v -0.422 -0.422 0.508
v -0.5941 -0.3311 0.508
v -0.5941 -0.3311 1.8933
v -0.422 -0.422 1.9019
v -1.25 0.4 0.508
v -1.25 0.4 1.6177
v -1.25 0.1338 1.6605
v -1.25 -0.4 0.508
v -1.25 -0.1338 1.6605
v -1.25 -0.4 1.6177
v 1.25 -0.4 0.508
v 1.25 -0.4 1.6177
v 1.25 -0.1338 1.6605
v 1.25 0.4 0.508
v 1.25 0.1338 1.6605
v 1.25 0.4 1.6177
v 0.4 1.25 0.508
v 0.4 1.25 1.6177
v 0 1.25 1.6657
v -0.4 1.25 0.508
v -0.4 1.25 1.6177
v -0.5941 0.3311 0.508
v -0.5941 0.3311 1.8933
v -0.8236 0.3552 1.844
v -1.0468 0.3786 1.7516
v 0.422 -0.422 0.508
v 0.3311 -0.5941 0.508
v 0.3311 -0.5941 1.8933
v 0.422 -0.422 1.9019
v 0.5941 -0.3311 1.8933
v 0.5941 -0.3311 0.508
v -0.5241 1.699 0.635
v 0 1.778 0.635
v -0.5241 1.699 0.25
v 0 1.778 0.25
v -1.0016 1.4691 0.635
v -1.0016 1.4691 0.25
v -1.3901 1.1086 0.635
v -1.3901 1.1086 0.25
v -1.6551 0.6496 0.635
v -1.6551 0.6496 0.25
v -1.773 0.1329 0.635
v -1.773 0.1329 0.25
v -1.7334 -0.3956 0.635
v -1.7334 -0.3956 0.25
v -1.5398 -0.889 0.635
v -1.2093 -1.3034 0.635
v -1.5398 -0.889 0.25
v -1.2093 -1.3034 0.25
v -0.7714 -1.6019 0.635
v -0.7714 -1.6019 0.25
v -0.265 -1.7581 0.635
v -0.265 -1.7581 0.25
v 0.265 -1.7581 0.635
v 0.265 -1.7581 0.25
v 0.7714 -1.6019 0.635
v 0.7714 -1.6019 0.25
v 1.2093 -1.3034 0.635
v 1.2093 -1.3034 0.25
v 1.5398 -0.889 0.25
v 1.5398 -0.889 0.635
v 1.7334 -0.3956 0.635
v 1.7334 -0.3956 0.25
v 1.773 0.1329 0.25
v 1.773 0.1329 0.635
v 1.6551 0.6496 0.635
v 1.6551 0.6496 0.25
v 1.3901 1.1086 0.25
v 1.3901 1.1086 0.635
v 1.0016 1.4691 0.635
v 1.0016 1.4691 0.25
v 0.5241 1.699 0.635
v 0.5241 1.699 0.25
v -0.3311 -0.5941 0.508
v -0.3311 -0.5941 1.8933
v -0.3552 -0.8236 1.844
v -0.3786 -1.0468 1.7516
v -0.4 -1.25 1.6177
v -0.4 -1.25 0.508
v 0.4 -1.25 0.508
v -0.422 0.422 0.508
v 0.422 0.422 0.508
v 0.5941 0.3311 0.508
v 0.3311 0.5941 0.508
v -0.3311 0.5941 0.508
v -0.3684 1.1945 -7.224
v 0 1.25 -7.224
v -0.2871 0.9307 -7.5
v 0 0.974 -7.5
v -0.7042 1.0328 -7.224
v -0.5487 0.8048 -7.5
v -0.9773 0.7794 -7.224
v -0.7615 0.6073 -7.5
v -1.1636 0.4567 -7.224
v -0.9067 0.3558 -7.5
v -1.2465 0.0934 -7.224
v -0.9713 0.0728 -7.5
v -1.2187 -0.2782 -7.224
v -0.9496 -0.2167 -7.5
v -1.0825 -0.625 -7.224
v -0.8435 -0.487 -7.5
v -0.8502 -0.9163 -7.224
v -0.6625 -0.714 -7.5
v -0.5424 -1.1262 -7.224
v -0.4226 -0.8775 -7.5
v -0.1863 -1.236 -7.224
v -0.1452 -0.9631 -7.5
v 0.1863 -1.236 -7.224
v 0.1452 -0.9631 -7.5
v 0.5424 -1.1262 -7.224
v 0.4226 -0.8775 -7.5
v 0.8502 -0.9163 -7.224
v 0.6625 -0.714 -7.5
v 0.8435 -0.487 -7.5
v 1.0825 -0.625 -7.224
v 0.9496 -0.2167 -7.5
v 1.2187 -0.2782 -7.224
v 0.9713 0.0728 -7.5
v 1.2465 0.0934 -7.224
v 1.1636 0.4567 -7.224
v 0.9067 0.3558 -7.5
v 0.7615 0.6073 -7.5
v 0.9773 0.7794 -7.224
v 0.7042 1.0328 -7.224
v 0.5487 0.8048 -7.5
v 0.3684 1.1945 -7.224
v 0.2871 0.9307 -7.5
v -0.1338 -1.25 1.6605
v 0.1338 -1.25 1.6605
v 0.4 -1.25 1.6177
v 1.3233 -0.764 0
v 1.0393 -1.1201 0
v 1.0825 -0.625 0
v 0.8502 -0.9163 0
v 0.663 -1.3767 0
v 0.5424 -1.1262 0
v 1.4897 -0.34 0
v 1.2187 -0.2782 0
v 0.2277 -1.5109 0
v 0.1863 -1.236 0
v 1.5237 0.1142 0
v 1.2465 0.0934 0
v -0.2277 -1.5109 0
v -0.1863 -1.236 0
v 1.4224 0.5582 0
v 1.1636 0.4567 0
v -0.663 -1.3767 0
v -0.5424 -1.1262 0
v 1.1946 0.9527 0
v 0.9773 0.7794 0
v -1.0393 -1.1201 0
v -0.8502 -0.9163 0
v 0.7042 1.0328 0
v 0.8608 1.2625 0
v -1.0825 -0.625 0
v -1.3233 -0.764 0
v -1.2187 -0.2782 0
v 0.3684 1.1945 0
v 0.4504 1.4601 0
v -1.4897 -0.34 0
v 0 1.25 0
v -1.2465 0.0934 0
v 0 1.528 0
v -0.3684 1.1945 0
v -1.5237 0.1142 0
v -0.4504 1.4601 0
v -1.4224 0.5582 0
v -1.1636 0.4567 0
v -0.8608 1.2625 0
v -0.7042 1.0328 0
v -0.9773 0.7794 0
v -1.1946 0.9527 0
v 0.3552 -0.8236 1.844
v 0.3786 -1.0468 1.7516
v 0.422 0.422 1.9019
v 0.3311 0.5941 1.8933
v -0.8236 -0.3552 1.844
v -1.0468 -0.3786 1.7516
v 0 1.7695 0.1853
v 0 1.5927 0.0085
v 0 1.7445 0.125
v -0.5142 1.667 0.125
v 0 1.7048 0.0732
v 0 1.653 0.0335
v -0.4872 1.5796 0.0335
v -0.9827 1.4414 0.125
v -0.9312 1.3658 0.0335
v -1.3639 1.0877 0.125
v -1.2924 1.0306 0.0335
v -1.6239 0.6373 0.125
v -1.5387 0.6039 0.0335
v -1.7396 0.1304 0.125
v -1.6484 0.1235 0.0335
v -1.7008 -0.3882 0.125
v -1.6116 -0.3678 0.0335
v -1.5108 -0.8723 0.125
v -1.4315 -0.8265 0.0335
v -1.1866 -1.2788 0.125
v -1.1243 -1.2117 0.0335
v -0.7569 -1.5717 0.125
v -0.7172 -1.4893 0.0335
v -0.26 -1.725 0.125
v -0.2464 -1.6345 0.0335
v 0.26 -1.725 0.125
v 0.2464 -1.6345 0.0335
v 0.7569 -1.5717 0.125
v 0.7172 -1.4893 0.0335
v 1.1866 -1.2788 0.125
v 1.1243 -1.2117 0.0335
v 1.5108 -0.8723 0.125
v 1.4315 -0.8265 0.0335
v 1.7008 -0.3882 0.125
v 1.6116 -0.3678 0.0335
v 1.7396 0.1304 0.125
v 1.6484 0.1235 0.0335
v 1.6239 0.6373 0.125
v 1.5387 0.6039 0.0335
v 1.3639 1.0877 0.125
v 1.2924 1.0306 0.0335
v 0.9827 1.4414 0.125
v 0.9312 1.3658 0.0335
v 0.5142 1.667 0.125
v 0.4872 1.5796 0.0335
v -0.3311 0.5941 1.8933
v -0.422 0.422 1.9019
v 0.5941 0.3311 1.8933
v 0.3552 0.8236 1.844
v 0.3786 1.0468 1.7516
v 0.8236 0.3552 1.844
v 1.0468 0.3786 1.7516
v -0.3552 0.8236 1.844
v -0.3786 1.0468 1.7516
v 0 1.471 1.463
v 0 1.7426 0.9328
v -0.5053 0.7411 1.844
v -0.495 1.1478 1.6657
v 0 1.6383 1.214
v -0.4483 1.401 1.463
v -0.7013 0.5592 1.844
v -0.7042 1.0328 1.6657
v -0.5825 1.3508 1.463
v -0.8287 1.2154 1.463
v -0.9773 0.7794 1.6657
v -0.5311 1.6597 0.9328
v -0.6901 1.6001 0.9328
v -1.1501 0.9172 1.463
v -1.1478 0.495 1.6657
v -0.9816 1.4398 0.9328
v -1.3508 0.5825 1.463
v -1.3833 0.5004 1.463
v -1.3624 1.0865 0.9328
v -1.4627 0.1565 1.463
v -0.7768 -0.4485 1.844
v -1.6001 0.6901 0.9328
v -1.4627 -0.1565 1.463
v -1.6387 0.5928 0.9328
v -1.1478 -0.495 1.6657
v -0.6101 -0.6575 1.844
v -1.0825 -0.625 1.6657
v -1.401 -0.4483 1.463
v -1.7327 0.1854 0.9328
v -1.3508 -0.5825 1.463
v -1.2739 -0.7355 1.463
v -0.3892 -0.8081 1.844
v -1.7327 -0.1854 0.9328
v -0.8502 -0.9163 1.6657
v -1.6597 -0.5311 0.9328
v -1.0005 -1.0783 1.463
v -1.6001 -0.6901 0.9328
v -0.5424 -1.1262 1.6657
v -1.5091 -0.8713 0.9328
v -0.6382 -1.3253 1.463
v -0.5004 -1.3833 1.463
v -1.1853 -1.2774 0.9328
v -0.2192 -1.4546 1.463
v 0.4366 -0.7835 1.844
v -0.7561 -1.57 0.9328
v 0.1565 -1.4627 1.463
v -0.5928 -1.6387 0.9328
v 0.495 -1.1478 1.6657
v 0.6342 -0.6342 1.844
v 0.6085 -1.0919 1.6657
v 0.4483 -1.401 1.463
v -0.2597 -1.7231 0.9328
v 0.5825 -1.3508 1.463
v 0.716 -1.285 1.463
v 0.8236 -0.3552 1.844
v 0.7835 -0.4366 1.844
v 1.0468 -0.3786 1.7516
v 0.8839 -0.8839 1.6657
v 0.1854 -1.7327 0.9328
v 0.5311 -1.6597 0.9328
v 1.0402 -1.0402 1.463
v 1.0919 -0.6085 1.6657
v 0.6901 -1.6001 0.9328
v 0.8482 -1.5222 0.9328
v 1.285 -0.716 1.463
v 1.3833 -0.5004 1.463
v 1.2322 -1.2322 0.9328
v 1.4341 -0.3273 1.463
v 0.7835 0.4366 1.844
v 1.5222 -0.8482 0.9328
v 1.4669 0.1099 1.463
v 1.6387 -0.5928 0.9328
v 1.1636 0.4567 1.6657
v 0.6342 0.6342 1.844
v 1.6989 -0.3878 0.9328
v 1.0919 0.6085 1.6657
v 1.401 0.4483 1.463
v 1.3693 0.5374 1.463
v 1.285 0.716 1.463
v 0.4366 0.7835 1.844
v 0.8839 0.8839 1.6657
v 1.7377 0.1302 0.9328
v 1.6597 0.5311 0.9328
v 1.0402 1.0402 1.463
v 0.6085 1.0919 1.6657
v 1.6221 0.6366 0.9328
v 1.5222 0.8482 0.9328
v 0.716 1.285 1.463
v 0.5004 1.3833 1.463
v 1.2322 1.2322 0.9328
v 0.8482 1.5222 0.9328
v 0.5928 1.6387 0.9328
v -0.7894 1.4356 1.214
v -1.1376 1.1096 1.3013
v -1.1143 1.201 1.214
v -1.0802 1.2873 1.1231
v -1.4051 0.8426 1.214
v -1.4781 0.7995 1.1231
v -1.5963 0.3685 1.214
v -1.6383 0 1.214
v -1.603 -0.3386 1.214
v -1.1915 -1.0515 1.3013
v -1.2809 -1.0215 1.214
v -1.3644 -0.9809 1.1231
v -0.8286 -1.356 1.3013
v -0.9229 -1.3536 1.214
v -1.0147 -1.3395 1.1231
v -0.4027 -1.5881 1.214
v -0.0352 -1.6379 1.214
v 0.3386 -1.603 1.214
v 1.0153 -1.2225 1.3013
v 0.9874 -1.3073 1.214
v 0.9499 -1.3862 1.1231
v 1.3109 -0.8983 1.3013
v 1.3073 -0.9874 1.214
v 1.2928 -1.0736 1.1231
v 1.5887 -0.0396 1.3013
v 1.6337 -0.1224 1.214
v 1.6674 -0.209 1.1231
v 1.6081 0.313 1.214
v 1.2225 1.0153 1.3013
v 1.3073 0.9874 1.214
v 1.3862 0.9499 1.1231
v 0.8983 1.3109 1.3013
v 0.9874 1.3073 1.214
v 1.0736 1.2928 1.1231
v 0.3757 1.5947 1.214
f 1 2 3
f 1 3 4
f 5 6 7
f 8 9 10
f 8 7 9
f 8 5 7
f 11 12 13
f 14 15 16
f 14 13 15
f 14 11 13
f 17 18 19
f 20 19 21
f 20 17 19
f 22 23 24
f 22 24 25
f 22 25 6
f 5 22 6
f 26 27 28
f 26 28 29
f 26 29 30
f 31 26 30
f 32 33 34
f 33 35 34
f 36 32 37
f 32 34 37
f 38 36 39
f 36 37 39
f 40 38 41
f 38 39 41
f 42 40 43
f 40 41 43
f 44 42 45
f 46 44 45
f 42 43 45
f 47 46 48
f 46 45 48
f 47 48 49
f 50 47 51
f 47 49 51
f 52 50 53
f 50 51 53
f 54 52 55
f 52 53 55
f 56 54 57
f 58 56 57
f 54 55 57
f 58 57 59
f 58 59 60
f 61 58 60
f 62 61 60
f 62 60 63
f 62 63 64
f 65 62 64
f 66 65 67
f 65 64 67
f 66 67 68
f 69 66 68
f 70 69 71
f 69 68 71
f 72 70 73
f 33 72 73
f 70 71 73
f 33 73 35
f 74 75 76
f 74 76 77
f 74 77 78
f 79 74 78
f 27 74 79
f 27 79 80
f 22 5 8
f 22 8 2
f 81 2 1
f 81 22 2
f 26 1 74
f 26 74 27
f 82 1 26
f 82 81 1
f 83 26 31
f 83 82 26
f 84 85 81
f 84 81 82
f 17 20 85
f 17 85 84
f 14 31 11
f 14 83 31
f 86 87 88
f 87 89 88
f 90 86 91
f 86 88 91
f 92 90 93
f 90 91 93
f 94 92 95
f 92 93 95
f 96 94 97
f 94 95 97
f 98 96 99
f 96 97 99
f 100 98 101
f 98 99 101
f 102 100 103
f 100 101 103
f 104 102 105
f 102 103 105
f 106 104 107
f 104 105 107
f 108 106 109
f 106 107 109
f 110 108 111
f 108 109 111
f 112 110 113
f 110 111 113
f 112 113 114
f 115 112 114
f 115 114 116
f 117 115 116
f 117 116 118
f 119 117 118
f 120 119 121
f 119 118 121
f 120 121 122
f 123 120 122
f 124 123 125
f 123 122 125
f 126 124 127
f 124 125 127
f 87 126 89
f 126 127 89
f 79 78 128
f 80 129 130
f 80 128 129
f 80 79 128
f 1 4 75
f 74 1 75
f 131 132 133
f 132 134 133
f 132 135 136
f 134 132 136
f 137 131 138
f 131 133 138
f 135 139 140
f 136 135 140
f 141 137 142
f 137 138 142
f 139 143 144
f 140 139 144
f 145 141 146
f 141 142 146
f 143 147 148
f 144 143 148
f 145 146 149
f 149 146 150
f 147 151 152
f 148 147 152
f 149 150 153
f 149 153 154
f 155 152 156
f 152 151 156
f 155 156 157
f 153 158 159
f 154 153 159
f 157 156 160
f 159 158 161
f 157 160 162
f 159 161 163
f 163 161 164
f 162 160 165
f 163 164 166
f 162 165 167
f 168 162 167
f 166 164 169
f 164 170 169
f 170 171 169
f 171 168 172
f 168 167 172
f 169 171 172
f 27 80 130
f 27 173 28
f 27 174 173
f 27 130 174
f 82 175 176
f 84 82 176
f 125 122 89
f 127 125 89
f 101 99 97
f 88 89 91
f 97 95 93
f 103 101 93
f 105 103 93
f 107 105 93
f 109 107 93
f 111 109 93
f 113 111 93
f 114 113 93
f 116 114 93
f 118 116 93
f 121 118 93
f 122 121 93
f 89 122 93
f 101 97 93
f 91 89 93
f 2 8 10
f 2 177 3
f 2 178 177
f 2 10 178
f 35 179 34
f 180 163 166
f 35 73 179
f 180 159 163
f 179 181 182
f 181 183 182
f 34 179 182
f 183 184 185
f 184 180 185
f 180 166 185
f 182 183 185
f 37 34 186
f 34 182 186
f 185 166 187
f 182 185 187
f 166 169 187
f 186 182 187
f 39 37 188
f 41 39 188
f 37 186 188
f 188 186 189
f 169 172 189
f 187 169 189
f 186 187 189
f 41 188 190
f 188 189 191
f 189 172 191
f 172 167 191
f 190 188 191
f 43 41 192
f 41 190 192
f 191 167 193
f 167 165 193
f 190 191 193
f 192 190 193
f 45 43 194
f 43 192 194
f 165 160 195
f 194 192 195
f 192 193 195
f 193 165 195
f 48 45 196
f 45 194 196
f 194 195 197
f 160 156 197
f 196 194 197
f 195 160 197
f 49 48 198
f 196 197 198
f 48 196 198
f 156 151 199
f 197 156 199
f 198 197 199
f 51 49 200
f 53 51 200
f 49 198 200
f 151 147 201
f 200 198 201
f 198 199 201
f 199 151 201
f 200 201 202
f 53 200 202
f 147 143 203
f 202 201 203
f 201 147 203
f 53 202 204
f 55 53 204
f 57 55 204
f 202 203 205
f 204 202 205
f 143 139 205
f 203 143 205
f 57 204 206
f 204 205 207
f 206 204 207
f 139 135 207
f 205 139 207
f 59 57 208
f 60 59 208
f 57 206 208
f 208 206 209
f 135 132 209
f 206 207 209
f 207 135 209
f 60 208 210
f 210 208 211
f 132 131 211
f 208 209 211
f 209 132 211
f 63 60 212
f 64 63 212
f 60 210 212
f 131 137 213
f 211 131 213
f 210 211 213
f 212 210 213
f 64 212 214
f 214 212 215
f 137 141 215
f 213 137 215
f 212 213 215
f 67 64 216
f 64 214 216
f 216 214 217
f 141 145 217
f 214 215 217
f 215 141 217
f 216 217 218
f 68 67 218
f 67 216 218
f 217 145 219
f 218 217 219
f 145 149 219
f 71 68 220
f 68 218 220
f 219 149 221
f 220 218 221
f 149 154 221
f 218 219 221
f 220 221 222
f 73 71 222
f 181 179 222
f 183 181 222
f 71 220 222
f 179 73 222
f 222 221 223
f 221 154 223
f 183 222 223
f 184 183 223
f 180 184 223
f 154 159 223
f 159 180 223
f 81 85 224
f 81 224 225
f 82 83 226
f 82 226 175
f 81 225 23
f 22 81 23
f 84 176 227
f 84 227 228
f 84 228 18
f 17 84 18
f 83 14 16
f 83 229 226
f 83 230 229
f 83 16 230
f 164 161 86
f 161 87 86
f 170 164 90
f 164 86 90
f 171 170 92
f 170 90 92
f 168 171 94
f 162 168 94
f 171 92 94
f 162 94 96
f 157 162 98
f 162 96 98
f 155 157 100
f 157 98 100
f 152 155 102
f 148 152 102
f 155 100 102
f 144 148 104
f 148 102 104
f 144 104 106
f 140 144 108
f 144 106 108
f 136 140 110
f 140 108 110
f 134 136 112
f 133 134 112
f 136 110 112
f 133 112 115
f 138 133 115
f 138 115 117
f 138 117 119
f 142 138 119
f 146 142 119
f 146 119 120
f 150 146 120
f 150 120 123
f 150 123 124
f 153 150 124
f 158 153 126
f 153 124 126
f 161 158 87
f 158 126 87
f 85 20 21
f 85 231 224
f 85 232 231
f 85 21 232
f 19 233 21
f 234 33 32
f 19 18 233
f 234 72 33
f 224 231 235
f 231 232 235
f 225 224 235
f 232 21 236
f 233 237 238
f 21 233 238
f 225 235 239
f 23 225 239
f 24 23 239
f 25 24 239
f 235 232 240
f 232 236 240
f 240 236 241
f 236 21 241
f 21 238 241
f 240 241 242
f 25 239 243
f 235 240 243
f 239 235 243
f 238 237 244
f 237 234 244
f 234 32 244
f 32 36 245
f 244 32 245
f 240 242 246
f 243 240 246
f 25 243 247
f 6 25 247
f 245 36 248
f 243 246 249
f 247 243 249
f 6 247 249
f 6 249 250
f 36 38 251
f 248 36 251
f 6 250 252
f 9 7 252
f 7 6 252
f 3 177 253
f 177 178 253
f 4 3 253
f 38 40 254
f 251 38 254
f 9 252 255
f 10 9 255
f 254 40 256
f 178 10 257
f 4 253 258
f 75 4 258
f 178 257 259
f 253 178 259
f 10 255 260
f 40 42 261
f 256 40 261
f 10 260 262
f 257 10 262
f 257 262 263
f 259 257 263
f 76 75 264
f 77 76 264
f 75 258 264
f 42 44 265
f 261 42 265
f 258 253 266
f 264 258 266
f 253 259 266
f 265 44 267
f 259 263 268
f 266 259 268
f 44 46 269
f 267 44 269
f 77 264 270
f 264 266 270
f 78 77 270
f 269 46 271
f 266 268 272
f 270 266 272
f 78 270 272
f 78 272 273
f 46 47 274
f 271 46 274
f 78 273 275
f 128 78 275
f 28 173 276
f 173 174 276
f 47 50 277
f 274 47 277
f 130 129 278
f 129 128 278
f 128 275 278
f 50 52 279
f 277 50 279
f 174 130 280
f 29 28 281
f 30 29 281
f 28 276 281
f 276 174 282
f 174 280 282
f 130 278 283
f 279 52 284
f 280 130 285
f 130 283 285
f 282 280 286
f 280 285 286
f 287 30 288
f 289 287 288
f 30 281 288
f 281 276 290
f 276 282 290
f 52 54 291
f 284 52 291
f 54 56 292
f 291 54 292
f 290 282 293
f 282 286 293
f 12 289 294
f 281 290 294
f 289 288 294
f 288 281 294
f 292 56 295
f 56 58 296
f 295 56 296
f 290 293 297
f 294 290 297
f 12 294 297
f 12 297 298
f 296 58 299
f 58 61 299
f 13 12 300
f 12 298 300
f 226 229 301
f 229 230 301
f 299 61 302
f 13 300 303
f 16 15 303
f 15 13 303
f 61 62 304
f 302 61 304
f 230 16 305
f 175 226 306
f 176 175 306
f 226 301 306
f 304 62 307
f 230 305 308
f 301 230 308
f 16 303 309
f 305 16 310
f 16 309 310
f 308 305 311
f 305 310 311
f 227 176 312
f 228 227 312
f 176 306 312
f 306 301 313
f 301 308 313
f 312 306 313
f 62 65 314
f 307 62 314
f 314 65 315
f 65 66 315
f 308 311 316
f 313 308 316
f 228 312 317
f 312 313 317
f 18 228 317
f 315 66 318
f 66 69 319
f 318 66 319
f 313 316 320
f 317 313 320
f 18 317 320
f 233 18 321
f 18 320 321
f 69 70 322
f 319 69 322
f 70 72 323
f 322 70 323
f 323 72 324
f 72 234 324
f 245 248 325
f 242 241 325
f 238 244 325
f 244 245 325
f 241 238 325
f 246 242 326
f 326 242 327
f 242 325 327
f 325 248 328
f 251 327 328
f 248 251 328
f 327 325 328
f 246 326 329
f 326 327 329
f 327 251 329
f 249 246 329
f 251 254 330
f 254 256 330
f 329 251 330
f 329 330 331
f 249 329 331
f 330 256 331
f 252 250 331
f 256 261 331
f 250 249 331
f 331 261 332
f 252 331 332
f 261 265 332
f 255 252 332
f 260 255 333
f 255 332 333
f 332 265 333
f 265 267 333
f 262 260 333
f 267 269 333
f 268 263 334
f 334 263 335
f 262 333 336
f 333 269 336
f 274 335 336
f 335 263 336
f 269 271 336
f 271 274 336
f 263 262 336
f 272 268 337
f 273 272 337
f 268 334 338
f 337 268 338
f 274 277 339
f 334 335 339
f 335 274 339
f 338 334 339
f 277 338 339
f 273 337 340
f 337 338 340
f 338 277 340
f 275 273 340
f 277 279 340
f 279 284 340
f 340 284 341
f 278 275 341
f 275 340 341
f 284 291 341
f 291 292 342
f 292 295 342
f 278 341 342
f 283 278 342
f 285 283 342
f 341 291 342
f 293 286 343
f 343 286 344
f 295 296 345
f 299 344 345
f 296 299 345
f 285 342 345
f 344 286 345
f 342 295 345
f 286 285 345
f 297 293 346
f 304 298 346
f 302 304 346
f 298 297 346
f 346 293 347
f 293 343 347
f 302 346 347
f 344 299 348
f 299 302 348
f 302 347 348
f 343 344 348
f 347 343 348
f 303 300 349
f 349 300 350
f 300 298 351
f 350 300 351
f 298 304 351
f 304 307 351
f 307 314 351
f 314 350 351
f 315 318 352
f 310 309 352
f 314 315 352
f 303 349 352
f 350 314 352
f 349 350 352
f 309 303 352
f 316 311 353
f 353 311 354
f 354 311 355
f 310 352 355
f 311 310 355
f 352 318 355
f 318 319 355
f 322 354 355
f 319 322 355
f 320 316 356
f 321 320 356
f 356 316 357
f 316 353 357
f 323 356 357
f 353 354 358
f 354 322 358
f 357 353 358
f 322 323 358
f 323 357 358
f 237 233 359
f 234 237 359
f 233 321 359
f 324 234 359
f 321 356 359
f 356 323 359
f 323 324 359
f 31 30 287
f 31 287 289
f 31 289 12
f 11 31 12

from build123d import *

# Parameters (mm, degrees)
CUT_EXTRUDE1_DEPTH = 1.524


with BuildPart() as part:
    # Sketch1 → Revolve1 (revolve)
    with BuildSketch(Plane(origin=(0, 0, 0), x_dir=(0, 0, -1), z_dir=(1, 0, 0))):
        with BuildLine():
            Line((-1.905, 0), (-1.905, 0.508))
            ThreePointArc((-1.905, 0.508), (-1.533025612, 1.406025612), (-0.635, 1.778))
            Line((-0.635, 1.778), (-0.250000008, 1.778))
            ThreePointArc((-0.250000008, 1.778), (-0.073223307, 1.704776693), (0, 1.527999992))
            Line((0, 1.527999992), (0, 1.25))
            Line((0, 1.25), (7.224, 1.25))
            Line((7.224, 1.25), (7.5, 0.974))
            Line((7.5, 0.974), (7.5, 0))
            Line((7.5, 0), (-1.905, 0))
        make_face()
    revolve(axis=Axis((0, 0, -7.5), (0, 0, 1)))

    # Sketch2 → Cut-Extrude1 (cut)
    with BuildSketch(Plane.XY.offset(0.508)):
        Polygon((-1.25000004, 0.399999962), (-1.25000004, -0.399999962), (-0.594105965, -0.331062717), (-0.421980421, -0.421980421), (-0.331062717, -0.594105965), (-0.399999962, -1.25000004), (0.399999962, -1.25000004), (0.331062717, -0.594105965), (0.421980421, -0.421980421), (0.594105965, -0.331062717), (1.25000004, -0.399999962), (1.25000004, 0.399999962), (0.594105965, 0.331062717), (0.421980421, 0.421980421), (0.331062717, 0.594105965), (0.399999962, 1.25000004), (-0.399999962, 1.25000004), (-0.331062717, 0.594105965), (-0.421980421, 0.421980421), (-0.594105965, 0.331062717), align=None)
    extrude(amount=CUT_EXTRUDE1_DEPTH, mode=Mode.SUBTRACT)


solid = part.part
